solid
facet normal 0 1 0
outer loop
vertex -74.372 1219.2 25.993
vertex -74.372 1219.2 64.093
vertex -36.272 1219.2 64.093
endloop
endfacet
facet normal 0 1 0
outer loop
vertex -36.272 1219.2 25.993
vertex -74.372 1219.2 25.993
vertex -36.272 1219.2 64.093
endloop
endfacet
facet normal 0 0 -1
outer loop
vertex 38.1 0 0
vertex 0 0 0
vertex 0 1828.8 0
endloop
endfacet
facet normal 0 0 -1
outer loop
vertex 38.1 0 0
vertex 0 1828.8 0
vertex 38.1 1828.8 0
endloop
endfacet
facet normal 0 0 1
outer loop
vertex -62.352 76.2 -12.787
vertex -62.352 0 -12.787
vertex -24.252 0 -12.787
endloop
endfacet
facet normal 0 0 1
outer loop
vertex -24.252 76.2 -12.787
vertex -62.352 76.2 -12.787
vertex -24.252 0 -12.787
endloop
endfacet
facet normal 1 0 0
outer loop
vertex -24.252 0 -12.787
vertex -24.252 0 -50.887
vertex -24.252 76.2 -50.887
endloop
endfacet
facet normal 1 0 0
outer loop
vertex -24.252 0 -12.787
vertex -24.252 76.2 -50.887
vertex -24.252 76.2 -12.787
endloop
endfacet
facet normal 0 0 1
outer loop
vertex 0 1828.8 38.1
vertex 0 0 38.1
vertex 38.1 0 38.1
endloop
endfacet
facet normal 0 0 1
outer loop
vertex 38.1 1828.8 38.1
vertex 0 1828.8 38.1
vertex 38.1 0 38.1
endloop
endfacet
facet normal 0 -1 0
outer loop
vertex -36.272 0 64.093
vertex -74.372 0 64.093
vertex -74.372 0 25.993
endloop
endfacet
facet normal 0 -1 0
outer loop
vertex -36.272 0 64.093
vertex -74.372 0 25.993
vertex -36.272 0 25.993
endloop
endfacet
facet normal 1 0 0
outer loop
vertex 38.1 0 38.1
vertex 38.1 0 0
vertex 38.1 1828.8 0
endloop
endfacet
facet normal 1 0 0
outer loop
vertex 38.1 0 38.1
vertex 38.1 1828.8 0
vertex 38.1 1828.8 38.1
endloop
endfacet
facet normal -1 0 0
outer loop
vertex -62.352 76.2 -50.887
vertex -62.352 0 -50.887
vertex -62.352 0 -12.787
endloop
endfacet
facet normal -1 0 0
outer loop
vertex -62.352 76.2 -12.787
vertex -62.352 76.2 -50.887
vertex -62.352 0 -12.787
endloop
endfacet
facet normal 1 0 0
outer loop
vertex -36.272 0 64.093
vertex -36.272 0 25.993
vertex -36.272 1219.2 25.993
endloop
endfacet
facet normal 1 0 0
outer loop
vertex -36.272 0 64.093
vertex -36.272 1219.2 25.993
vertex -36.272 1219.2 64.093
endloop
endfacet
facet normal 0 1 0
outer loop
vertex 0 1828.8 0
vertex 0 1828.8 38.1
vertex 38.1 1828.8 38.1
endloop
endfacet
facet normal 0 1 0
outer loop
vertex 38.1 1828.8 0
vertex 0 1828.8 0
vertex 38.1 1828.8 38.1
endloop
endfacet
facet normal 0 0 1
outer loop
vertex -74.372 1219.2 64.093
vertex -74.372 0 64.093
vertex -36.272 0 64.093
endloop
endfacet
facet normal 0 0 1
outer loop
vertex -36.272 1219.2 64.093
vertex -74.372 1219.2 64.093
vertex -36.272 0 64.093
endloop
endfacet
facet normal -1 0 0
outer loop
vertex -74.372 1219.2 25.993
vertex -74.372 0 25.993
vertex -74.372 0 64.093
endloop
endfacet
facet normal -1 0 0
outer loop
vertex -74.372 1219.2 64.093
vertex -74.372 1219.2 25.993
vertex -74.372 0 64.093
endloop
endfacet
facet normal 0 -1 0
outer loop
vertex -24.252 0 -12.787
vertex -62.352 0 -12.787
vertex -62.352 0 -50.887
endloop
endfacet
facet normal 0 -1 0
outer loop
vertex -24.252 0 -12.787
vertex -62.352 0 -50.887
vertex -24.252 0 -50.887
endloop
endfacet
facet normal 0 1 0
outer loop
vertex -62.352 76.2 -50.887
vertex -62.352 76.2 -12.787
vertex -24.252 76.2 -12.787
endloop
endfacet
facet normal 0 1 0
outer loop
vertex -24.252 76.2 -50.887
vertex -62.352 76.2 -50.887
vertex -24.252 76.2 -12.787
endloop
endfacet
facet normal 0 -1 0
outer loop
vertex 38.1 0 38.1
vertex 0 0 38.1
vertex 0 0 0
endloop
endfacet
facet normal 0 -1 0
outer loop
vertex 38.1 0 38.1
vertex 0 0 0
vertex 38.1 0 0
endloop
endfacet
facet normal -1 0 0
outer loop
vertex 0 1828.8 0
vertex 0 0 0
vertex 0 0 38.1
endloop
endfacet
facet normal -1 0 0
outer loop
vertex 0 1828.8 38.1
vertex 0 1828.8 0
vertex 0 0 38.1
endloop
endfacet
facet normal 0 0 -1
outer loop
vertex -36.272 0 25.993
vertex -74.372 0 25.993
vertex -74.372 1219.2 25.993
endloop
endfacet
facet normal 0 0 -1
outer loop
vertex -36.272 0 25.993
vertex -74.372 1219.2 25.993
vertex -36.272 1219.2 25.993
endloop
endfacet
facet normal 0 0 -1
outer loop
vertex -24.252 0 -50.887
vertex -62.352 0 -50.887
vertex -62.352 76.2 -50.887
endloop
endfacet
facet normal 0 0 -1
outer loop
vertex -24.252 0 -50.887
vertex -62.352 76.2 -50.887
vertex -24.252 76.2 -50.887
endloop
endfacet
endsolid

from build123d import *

# Parameters (mm, degrees)
F0_W     = 38.1
F0_H     = 38.1
F1_DEPTH = 1828.8
F2_W     = 38.1
F2_H     = 38.1
F3_DEPTH = 1219.2
F4_DEPTH = 76.2


with BuildPart() as f1:
    # F0 (on Front) → F1 (new body)
    with BuildSketch(Plane.XZ):
        with Locations((19.05, 19.05)):
            Rectangle(F0_W, F0_H)
    extrude(amount=-F1_DEPTH)


with BuildPart() as f3:
    # F2 (on Front) → F3 (new body)
    with BuildSketch(Plane.XZ):
        with Locations((-55.322108, 45.04293)):
            Rectangle(F2_W, F2_H)
    extrude(amount=-F3_DEPTH)


with BuildPart() as f4:
    # F2 (on Front) → F4 (new body)
    with BuildSketch(Plane.XZ):
        with Locations((-43.302466, -31.837431)):
            Rectangle(F2_W, F2_H)
    extrude(amount=-F4_DEPTH)


solid = Compound([f1.part, f3.part, f4.part])
